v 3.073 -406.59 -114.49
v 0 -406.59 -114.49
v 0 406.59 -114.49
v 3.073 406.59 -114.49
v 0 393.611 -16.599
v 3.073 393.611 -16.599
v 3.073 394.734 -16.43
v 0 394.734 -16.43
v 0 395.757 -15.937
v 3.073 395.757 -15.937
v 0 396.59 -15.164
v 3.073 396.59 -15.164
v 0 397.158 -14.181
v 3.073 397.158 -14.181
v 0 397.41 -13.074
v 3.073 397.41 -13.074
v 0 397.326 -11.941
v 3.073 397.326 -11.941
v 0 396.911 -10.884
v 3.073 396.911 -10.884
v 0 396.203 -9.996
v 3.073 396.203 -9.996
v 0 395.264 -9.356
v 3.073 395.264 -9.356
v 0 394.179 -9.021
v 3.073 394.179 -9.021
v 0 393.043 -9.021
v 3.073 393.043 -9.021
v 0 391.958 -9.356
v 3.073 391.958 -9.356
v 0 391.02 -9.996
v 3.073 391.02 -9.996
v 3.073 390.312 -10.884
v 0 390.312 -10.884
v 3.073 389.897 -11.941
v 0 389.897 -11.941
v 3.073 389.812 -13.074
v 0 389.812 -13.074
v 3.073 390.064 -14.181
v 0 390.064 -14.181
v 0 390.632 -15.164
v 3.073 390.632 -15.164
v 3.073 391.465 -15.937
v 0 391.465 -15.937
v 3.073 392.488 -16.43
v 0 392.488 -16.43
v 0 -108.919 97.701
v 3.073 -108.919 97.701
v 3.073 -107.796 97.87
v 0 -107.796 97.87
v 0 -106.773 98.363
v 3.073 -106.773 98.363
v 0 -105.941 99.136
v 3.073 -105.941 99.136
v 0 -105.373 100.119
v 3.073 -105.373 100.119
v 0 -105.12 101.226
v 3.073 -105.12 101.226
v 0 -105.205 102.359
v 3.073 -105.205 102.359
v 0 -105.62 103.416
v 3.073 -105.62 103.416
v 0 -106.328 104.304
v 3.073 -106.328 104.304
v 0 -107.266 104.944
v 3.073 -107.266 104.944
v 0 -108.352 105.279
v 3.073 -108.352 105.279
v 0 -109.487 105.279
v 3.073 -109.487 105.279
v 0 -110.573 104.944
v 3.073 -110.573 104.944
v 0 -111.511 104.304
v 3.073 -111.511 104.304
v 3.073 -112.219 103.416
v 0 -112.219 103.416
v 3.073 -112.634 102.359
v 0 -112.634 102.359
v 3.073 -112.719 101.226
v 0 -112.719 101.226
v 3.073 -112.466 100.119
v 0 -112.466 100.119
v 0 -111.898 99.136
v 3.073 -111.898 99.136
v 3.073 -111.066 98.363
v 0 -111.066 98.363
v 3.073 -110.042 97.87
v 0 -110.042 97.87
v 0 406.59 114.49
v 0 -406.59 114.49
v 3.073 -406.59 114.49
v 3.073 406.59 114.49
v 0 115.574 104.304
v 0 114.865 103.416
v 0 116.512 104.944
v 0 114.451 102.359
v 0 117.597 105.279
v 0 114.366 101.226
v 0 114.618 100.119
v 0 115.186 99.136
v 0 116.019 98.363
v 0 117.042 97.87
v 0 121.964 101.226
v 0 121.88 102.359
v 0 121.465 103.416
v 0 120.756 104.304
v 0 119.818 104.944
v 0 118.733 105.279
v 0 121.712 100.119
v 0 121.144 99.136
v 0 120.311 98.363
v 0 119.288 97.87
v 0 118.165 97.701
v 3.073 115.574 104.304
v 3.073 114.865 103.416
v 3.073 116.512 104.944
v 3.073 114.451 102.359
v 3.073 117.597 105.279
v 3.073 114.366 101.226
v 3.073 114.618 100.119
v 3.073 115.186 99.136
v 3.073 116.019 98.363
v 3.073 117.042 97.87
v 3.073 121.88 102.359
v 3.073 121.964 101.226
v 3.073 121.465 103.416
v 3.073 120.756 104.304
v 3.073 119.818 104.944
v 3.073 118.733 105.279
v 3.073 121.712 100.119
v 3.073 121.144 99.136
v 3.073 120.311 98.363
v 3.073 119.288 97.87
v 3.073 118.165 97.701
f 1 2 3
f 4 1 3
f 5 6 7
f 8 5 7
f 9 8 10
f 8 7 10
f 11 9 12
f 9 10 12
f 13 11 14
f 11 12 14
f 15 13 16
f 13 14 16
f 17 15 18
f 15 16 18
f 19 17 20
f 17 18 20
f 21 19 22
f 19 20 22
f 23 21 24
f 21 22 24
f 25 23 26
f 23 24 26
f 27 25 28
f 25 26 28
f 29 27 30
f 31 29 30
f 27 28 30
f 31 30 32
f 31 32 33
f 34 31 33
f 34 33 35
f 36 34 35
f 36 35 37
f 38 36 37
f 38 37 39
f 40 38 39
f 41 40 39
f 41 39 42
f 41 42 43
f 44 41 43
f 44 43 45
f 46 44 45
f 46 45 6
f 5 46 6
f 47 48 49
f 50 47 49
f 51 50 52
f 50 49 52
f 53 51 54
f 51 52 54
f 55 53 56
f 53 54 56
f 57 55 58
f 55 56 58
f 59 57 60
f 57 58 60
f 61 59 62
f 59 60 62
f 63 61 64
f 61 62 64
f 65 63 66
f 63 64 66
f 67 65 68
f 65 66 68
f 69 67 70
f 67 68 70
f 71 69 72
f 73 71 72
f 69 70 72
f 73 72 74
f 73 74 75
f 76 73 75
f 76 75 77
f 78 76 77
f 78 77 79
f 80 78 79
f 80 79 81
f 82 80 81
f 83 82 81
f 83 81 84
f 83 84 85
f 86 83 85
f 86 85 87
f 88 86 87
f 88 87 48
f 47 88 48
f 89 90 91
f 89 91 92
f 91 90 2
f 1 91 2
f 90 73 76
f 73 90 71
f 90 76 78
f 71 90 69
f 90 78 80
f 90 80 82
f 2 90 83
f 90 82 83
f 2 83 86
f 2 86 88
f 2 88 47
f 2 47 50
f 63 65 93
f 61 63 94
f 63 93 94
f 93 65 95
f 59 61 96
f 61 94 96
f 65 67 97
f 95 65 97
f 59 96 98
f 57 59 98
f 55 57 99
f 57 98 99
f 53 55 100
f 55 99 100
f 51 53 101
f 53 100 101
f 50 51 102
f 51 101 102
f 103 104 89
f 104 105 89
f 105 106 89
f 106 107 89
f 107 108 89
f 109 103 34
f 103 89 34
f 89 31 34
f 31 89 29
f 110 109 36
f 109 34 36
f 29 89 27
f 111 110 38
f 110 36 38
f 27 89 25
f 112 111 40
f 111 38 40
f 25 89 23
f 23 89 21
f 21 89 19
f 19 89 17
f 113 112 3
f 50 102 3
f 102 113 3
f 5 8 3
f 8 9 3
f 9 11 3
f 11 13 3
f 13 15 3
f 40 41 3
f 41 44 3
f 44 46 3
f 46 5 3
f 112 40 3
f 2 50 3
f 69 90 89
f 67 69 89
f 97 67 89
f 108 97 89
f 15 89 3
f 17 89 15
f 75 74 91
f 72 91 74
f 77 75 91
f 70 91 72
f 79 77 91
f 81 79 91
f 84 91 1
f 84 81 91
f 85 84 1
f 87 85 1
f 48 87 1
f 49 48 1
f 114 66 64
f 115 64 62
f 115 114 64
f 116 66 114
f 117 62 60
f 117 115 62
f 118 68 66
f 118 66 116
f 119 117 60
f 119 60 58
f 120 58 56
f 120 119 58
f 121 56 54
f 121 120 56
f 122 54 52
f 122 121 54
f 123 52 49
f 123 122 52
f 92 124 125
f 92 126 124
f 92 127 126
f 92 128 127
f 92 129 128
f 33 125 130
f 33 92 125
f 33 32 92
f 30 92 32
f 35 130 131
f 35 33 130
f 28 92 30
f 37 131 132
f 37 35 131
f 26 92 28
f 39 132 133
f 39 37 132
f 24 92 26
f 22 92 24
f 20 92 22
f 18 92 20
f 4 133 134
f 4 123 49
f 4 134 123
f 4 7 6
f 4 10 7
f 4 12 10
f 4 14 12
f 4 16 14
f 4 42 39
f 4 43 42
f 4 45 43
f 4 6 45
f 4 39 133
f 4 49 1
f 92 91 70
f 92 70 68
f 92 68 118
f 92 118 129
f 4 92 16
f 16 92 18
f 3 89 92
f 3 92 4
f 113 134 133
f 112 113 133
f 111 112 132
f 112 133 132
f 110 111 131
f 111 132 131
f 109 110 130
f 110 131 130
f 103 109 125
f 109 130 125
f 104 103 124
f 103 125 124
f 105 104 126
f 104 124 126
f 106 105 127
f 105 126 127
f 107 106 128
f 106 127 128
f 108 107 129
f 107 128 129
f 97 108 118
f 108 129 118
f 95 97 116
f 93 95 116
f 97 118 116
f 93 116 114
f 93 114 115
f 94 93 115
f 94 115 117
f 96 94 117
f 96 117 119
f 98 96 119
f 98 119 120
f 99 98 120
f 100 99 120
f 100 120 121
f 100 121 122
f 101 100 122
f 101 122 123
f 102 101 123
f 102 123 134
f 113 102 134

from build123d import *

# Parameters (mm, degrees)
SKETCH1_W           = 228.981
SKETCH1_H           = 813.181
BOSS_EXTRUDE1_DEPTH = 3.0734
CUT_EXTRUDE1_REACH  = 5.073
SKETCH2_R           = 3.81


with BuildPart() as part:
    # Sketch1 → Boss-Extrude1 (new body)
    with BuildSketch(Plane(origin=(0, 0, 0), x_dir=(0, 0, -1), z_dir=(1, 0, 0))):
        Rectangle(SKETCH1_W, SKETCH1_H)
    extrude(amount=BOSS_EXTRUDE1_DEPTH)

    # Sketch2 → Cut-Extrude1 (cut, up to next)
    with BuildSketch(Plane(origin=(3.0734, 0, 0), x_dir=(0, 0, -1), z_dir=(1, 0, 0)), mode=Mode.PRIVATE) as cut_extrude1_sk1:
        with Locations((12.7889, 393.6111)):
            Circle(SKETCH2_R)
    cut_extrude1_tool1 = extrude(cut_extrude1_sk1.sketch, amount=-CUT_EXTRUDE1_REACH, mode=Mode.PRIVATE) & part.part
    add(cut_extrude1_tool1.solids().sort_by_distance((3.0734, 393.6111, -12.7889))[0], mode=Mode.SUBTRACT)
    # Sketch2 → Cut-Extrude1 (cut, up to next)
    with BuildSketch(Plane(origin=(3.0734, 0, 0), x_dir=(0, 0, -1), z_dir=(1, 0, 0)), mode=Mode.PRIVATE) as cut_extrude1_sk2:
        with Locations((-101.5111, 118.165033333)):
            Circle(SKETCH2_R)
    cut_extrude1_tool2 = extrude(cut_extrude1_sk2.sketch, amount=-CUT_EXTRUDE1_REACH, mode=Mode.PRIVATE) & part.part
    add(cut_extrude1_tool2.solids().sort_by_distance((3.0734, 118.165033, 101.5111))[0], mode=Mode.SUBTRACT)
    # Sketch2 → Cut-Extrude1 (cut, up to next)
    with BuildSketch(Plane(origin=(3.0734, 0, 0), x_dir=(0, 0, -1), z_dir=(1, 0, 0)), mode=Mode.PRIVATE) as cut_extrude1_sk3:
        with Locations((-101.5111, -108.919433333)):
            Circle(SKETCH2_R)
    cut_extrude1_tool3 = extrude(cut_extrude1_sk3.sketch, amount=-CUT_EXTRUDE1_REACH, mode=Mode.PRIVATE) & part.part
    add(cut_extrude1_tool3.solids().sort_by_distance((3.0734, -108.919433, 101.5111))[0], mode=Mode.SUBTRACT)


solid = part.part
